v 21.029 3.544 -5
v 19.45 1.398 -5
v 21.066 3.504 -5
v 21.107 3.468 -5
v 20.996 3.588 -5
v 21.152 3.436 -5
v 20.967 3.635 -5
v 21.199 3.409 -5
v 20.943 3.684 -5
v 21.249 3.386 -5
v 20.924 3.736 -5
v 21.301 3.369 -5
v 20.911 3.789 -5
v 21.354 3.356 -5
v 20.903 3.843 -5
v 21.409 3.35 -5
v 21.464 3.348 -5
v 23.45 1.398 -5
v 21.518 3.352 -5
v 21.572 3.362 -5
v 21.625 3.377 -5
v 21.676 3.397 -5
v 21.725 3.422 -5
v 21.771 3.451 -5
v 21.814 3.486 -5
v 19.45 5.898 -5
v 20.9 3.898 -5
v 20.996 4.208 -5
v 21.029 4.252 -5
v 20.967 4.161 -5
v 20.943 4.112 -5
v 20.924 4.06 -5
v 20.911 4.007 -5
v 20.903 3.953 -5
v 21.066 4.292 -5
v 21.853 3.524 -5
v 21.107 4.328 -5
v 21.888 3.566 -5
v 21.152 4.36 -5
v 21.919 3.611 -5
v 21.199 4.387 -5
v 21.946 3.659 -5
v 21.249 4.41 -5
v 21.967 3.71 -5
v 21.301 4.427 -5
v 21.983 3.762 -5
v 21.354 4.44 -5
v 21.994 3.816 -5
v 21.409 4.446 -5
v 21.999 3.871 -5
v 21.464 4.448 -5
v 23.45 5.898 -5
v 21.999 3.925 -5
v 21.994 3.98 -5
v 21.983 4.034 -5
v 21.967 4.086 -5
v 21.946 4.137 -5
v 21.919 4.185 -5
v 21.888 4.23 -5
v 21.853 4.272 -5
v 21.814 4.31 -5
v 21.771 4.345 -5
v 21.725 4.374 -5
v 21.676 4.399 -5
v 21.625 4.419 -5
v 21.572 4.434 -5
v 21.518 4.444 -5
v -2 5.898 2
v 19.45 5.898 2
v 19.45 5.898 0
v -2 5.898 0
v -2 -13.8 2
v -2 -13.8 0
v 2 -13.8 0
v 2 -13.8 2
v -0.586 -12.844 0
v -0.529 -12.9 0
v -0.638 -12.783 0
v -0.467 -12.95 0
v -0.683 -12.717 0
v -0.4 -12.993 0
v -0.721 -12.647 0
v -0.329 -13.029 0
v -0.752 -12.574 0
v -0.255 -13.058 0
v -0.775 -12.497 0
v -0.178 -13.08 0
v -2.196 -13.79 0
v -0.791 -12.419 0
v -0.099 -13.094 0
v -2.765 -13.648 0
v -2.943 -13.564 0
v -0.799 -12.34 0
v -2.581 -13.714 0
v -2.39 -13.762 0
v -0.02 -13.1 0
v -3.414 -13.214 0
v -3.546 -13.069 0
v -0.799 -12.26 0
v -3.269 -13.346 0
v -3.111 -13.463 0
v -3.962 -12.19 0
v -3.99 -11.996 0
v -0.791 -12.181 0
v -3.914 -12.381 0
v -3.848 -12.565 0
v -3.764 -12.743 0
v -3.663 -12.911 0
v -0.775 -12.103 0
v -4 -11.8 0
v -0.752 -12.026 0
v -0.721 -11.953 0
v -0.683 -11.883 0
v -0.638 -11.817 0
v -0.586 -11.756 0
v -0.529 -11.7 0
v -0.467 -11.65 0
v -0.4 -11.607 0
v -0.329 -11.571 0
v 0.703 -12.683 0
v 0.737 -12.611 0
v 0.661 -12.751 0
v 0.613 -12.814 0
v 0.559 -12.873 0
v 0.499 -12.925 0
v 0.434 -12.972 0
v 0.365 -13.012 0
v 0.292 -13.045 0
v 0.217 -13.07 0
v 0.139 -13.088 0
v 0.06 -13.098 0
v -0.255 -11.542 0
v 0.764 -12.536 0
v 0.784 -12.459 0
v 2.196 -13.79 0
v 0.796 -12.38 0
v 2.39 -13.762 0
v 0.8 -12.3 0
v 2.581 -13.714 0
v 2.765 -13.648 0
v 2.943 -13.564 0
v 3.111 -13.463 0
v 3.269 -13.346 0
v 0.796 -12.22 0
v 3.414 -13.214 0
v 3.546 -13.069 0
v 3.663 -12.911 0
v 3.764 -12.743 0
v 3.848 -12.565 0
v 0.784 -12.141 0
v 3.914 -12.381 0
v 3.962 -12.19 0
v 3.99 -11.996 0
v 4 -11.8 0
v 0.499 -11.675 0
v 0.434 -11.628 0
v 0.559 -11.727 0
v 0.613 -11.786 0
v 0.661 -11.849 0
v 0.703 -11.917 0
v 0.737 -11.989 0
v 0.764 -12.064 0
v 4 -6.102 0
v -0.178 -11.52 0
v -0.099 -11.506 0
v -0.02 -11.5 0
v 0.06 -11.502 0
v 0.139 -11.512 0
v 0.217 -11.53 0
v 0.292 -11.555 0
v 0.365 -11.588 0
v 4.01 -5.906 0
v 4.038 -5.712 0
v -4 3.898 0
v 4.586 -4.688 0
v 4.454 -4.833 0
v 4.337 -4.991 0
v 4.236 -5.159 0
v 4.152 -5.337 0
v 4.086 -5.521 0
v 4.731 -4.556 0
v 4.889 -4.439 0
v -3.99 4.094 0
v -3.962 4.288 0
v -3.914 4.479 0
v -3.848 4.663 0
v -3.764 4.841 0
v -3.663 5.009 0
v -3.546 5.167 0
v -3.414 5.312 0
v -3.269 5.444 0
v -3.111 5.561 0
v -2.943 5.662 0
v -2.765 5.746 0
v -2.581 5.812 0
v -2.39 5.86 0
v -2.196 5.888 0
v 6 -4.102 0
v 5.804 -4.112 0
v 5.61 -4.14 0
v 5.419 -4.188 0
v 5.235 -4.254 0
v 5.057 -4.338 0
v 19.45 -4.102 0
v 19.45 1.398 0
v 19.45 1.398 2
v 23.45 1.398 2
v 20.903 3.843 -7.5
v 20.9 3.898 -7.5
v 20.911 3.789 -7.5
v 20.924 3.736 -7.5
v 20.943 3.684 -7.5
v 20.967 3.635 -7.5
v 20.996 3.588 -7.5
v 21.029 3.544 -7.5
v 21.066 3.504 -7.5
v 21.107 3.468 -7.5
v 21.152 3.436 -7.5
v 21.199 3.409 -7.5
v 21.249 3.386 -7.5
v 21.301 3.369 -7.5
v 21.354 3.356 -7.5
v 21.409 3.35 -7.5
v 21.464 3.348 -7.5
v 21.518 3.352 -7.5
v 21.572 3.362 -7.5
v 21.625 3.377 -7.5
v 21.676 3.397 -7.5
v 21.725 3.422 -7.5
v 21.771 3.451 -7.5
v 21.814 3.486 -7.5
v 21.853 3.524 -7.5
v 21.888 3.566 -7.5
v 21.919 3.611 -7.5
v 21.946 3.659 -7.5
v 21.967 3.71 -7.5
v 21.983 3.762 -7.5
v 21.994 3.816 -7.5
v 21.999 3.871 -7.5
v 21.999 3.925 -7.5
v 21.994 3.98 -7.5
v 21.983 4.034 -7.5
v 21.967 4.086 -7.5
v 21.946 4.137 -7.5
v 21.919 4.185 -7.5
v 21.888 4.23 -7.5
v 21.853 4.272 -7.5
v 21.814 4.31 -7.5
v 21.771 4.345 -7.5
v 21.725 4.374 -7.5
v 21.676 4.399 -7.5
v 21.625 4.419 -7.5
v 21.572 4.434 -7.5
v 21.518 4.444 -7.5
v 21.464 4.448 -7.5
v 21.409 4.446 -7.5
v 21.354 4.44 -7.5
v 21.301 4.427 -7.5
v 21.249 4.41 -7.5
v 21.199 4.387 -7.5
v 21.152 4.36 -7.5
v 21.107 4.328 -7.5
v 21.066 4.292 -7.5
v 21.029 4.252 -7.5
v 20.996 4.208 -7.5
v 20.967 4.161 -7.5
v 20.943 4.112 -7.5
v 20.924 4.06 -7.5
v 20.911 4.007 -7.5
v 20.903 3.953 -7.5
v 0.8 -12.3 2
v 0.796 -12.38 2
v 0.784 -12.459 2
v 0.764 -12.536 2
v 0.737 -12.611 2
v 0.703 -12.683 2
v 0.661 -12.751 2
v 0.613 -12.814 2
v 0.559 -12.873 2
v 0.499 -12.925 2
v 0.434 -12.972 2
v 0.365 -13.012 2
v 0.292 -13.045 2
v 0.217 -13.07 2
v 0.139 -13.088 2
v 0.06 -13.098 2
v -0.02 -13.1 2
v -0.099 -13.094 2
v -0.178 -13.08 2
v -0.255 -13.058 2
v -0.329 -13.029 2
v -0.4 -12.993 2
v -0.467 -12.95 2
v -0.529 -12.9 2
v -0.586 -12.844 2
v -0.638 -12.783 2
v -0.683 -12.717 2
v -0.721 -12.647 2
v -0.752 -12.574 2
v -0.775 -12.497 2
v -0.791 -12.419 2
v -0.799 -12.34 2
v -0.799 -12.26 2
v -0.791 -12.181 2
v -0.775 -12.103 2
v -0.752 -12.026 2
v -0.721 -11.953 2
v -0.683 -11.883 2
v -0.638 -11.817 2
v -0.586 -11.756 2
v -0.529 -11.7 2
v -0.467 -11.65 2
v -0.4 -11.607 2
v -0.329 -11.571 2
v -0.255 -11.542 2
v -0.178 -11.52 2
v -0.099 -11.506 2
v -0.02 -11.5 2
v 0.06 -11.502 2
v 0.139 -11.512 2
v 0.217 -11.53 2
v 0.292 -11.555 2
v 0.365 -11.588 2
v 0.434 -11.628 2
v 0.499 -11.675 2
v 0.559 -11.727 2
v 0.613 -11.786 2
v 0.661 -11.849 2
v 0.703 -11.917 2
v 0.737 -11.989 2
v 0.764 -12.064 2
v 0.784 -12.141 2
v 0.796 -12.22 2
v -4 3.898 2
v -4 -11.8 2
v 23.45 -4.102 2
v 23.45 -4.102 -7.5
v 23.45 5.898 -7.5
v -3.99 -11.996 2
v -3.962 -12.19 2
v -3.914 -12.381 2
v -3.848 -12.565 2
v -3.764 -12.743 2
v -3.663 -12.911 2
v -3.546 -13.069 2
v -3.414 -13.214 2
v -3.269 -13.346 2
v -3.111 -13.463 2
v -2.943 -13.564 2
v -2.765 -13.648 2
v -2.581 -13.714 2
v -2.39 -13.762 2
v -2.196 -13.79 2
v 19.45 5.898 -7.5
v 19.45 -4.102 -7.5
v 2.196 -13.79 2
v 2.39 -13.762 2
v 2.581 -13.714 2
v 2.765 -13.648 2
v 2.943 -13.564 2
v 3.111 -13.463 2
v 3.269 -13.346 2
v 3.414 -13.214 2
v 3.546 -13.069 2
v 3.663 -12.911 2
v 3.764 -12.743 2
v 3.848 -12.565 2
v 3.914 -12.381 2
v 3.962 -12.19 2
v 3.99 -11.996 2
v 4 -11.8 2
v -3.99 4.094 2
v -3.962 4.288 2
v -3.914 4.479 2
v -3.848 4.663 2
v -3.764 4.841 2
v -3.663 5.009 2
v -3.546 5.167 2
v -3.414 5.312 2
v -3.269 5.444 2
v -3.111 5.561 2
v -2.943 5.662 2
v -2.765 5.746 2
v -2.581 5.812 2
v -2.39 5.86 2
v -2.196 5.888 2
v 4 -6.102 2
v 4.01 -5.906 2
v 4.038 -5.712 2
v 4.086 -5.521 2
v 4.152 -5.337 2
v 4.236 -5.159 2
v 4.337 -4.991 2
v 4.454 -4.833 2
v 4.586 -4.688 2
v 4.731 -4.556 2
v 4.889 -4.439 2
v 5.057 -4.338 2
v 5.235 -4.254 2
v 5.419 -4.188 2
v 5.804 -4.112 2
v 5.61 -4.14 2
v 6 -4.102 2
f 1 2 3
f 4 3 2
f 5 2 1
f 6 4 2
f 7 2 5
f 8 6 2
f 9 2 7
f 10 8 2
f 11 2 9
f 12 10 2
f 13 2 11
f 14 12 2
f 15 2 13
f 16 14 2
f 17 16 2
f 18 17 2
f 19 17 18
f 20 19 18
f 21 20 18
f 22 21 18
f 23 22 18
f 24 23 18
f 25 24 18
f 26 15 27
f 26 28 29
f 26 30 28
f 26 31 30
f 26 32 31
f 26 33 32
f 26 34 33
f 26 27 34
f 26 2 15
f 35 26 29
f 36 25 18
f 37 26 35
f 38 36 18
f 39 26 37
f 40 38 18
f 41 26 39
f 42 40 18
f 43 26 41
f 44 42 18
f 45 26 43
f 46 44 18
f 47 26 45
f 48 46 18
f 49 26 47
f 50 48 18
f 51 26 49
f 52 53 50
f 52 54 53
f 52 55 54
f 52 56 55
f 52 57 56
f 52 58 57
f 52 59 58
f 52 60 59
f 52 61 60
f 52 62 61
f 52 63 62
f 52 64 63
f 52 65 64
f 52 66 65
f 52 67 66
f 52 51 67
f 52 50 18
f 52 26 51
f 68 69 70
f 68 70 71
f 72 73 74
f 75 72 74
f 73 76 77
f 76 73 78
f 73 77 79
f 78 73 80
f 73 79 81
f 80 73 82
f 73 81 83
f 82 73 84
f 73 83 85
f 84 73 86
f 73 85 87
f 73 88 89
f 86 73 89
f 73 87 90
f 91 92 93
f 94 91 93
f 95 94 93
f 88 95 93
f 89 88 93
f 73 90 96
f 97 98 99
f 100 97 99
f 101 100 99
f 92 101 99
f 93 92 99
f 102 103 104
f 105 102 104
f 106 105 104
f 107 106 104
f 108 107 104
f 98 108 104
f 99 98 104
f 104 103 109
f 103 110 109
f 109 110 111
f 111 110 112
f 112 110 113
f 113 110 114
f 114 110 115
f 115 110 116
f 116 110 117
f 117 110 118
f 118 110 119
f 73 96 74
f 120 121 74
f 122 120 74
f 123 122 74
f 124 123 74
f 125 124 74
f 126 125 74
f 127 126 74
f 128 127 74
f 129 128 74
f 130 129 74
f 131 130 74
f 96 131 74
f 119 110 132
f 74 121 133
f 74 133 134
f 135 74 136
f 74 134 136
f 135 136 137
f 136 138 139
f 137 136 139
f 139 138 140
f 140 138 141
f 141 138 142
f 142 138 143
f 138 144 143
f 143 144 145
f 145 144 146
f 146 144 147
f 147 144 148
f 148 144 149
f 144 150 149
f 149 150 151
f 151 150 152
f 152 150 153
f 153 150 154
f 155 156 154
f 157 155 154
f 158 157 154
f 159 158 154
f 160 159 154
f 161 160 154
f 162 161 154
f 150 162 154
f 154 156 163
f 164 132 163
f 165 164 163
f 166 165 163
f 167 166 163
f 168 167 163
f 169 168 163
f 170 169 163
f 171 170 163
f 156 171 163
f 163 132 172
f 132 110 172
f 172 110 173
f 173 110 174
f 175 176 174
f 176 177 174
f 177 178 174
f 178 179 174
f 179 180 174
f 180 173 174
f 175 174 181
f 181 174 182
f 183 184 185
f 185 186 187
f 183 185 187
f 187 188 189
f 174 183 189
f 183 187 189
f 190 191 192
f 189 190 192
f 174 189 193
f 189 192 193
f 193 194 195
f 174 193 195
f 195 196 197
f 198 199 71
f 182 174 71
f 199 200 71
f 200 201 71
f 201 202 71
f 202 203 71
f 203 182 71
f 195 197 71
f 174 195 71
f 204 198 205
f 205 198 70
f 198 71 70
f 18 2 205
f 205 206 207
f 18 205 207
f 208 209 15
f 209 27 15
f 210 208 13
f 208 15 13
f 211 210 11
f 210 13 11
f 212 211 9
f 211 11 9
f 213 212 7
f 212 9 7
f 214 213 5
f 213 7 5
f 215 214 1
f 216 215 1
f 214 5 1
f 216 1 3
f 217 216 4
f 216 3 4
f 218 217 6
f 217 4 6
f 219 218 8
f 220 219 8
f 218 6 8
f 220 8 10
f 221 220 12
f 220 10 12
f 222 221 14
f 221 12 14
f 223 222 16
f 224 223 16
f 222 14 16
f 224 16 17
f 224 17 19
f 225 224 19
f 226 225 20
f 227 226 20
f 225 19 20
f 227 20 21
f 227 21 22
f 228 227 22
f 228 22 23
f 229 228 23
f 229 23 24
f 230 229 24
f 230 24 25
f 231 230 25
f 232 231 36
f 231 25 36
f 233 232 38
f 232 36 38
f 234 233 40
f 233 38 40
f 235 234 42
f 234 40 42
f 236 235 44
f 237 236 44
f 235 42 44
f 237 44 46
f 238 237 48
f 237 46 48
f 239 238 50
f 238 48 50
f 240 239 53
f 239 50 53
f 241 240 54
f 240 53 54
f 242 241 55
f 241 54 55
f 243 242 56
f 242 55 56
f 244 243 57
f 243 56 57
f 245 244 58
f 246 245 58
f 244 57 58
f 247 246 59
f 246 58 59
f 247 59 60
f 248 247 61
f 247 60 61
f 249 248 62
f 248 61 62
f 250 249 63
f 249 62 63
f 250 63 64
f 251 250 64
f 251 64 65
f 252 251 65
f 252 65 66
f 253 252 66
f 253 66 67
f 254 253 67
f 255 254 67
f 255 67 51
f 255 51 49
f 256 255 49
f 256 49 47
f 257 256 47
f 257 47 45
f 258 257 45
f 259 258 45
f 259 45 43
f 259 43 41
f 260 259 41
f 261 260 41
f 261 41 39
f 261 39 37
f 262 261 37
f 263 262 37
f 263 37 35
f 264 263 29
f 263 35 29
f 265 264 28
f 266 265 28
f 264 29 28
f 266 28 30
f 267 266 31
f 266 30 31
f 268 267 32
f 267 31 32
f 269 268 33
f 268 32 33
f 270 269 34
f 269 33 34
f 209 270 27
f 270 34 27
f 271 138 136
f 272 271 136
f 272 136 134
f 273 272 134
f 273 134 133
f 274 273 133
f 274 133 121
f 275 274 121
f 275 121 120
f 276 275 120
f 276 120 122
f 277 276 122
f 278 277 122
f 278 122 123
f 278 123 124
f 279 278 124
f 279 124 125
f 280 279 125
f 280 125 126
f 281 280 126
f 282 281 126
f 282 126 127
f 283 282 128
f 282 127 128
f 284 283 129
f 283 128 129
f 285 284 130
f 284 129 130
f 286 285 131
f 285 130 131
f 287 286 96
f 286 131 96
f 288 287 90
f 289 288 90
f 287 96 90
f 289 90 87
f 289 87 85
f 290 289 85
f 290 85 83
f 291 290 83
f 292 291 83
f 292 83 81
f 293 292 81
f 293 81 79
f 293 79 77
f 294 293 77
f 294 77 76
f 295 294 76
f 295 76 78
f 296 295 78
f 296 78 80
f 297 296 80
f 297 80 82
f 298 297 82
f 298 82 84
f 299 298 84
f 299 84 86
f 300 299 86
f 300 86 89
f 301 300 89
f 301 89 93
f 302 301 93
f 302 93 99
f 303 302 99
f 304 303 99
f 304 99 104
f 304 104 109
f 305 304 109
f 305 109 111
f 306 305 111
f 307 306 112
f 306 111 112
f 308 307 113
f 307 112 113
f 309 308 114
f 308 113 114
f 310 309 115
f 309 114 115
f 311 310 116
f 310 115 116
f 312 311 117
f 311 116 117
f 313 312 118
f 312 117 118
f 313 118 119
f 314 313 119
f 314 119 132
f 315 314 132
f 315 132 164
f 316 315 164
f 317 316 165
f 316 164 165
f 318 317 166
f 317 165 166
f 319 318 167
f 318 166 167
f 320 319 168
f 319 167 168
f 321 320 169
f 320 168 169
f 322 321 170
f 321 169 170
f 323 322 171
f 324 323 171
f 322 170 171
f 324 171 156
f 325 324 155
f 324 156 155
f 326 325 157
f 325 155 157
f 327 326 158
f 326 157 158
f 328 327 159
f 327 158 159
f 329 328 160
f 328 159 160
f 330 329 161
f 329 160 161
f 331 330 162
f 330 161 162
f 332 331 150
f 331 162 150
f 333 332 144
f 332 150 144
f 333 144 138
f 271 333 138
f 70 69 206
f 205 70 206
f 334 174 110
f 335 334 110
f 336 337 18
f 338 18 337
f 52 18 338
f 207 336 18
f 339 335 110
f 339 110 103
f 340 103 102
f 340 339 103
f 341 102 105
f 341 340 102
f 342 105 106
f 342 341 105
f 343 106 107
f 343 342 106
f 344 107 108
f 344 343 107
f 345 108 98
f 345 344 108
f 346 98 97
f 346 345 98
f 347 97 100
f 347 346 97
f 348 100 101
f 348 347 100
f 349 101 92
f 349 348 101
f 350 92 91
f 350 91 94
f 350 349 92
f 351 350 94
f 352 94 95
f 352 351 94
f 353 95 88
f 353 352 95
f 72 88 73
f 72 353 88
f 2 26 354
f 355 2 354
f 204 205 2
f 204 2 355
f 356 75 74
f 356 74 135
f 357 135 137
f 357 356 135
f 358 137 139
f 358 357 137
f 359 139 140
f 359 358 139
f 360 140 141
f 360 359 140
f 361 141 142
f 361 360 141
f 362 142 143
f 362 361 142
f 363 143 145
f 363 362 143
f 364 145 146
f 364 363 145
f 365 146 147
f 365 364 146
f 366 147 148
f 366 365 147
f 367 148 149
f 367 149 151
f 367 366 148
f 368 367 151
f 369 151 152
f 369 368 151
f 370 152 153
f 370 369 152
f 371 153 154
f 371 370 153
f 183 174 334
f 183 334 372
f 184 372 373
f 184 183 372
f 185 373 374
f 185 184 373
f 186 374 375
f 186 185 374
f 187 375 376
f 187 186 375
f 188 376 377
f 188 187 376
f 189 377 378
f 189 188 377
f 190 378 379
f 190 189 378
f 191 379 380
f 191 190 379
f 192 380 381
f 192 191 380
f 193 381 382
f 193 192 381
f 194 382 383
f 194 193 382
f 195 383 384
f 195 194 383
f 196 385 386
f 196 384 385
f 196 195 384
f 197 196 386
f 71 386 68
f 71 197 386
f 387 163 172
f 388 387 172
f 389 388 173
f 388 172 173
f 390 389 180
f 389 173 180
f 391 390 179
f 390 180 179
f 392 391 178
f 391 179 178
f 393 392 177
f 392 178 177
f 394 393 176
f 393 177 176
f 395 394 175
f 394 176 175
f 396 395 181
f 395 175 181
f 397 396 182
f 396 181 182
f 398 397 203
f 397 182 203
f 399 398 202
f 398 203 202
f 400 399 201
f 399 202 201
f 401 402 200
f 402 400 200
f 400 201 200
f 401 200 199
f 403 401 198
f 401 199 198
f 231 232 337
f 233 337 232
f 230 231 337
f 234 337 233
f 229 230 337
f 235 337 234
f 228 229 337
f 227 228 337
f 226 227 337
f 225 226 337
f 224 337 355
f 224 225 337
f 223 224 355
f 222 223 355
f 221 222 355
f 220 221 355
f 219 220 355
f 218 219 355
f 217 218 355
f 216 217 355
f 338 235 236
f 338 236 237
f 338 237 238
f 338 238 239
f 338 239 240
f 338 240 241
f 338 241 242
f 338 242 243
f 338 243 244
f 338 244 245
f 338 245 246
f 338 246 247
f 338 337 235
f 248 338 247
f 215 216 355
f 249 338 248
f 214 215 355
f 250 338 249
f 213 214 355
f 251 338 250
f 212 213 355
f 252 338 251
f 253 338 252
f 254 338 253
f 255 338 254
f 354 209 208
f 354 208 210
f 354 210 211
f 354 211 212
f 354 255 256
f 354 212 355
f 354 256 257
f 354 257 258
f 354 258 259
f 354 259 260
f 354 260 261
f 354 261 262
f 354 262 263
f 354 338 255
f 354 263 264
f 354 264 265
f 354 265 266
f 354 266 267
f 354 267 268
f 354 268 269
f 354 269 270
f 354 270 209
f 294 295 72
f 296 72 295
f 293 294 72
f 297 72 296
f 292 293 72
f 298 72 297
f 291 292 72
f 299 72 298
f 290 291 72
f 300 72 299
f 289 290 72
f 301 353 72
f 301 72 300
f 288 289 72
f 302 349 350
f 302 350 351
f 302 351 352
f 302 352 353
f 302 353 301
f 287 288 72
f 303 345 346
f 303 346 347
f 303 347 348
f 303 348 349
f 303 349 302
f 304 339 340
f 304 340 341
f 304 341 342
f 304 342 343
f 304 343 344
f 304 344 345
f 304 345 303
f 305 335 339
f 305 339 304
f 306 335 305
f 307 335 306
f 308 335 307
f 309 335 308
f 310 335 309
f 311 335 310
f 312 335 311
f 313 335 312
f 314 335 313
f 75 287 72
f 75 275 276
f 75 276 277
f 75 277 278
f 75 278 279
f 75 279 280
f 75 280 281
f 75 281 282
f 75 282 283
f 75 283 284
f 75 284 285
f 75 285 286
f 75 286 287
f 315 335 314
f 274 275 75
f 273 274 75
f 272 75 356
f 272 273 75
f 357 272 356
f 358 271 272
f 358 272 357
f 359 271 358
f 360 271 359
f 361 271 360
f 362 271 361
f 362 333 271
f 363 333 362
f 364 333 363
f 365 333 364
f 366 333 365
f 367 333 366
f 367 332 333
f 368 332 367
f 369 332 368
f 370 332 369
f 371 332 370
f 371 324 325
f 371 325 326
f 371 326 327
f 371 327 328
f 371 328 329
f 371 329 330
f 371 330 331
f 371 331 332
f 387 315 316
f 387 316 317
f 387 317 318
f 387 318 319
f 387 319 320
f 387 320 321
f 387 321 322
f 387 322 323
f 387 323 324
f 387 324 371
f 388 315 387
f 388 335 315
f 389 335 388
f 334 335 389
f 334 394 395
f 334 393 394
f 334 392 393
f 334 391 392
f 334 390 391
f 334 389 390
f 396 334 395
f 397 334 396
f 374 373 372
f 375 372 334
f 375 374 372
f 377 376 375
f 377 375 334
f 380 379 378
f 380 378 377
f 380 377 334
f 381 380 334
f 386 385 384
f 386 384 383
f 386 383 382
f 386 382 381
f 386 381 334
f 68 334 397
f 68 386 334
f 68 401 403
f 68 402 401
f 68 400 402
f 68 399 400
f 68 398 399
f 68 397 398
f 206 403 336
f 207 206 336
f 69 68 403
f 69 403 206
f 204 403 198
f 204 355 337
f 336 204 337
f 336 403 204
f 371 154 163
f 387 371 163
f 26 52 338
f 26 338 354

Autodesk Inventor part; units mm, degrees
ref_plane "YZ Plane" through (0, 0, 0) normal (1, 0, 0) x (0, 1, 0)
ref_plane "XZ Plane" through (0, 0, 0) normal (0, 1, 0) x (-1, 0, 0)
sketch "スケッチ1" plane through (0, 0, 0) normal (0, 0, 1) x (1, 0, 0)
  circle A0 centre (0, 12.3) radius 0.8
  circle A1 centre (0, -12.3) radius 0.8
  line L0 (-4, -13.8) -> (4, -13.8)
  line L1 (4, -13.8) -> (4, 13.8)
  line L2 (4, 13.8) -> (-4, 13.8)
  line L3 (-4, 13.8) -> (-4, -13.8)
  line L4 (-4, -13.8) -> (4, 13.8) construction
  line L5 (4, -13.8) -> (-4, 13.8) construction
  point P0 (0, 0)
  dimension "d0" = 1.6
  dimension "d1" = 24.6
  dimension "d2" = 12.3
  dimension "d3" = 1.5
  dimension "d4" = 4
extrude "押し出し1" add sketch "スケッチ1" along normal blind 3
sketch "スケッチ2" plane through (0, 0, 3) normal (0, 0, 1) x (1, 0, 0)
  circle A0 centre (21.45, 3.898) radius 0.55 projected
  line L0 (19.45, 5.898) -> (19.45, -4.102) projected
  line L1 (19.45, -4.102) -> (23.45, -4.102) projected
  line L2 (23.45, -4.102) -> (23.45, 5.898) projected
  line L3 (23.45, 5.898) -> (19.45, 5.898) projected
  line L4 (23.45, -4.102) -> (4, -4.102)
  line L5 (4, -4.102) -> (4, 5.898)
  line L6 (4, 5.898) -> (23.45, 5.898)
  line L7 (23.45, 5.898) -> (23.45, -4.102)
  line L8 (4, -13.8) -> (4, 13.8) projected
  point P0 (0, 0)
extrude "押し出し2" add sketch "スケッチ2" against normal up to surface (3 mm away)
sketch "スケッチ3" plane through (0, 0, 0) normal (0, 0, -1) x (-1, 0, 0)
  circle A0 centre (-21.45, 3.898) radius 0.55 projected
  line L0 (-19.45, 5.898) -> (-19.45, -4.102) projected
  line L1 (-19.45, -4.102) -> (-23.45, -4.102) projected
  line L2 (-23.45, -4.102) -> (-23.45, 5.898) projected
  line L3 (-23.45, 5.898) -> (-19.45, 5.898) projected
  point P0 (0, 0)
ref_plane "作業平面1" through (19.45, -4.102, -7.5) normal (0, 0, 1) x (1, 0, 0)
extrude "押し出し3" add sketch "スケッチ3" along normal up to surface (7.5 mm away)
sketch "スケッチ4" plane through (0, 0, 3) normal (0, 0, 1) x (1, 0, 0)
  line L0 (23.45, -4.102) -> (23.45, 5.898) projected
  line L1 (19.45, 5.898) -> (19.45, -4.102) projected
  line L2 (23.45, 5.898) -> (19.45, 5.898)
  line L3 (19.45, 5.898) -> (19.45, 1.398)
  line L4 (19.45, 1.398) -> (23.45, 1.398)
  line L5 (23.45, 1.398) -> (23.45, 5.898)
  point P0 (0, 0)
  dimension "d11" = 4.5
extrude "押し出し4" cut sketch "スケッチ4" against normal blind 8
fillet "フィレット1" radius 2 4 edges at (4, -13.8, 1.5) (-4, -13.8, 1.5) (4, 13.8, 1.5) (-4, 13.8, 1.5)
move faces "移動1" translate (0, 0, -1) faces at (-1.3333, -1.3673, 3)
sketch "スケッチ5" plane through (4, -4.102, 2) normal (0, 0, 1) x (1, 0, 0)
  line L0 (15.45, 10) -> (0, 10) projected
  line L1 (0, 10) -> (-8, 10)
  line L2 (-8, 10) -> (-8, 17.902)
  line L3 (-8, 17.902) -> (0, 17.902)
  line L4 (0, 17.902) -> (0, 10)
  point P0 (-4, 4.102)
  point P1 (-8, 15.902)
  point P2 (-6, 17.902)
extrude "押し出し5" cut sketch "スケッチ5" against normal through all
fillet "フィレット2" radius 2 2 edges at (4, -4.102, 1) (-4, 5.898, 1)
properties part number "HbServoCover"
